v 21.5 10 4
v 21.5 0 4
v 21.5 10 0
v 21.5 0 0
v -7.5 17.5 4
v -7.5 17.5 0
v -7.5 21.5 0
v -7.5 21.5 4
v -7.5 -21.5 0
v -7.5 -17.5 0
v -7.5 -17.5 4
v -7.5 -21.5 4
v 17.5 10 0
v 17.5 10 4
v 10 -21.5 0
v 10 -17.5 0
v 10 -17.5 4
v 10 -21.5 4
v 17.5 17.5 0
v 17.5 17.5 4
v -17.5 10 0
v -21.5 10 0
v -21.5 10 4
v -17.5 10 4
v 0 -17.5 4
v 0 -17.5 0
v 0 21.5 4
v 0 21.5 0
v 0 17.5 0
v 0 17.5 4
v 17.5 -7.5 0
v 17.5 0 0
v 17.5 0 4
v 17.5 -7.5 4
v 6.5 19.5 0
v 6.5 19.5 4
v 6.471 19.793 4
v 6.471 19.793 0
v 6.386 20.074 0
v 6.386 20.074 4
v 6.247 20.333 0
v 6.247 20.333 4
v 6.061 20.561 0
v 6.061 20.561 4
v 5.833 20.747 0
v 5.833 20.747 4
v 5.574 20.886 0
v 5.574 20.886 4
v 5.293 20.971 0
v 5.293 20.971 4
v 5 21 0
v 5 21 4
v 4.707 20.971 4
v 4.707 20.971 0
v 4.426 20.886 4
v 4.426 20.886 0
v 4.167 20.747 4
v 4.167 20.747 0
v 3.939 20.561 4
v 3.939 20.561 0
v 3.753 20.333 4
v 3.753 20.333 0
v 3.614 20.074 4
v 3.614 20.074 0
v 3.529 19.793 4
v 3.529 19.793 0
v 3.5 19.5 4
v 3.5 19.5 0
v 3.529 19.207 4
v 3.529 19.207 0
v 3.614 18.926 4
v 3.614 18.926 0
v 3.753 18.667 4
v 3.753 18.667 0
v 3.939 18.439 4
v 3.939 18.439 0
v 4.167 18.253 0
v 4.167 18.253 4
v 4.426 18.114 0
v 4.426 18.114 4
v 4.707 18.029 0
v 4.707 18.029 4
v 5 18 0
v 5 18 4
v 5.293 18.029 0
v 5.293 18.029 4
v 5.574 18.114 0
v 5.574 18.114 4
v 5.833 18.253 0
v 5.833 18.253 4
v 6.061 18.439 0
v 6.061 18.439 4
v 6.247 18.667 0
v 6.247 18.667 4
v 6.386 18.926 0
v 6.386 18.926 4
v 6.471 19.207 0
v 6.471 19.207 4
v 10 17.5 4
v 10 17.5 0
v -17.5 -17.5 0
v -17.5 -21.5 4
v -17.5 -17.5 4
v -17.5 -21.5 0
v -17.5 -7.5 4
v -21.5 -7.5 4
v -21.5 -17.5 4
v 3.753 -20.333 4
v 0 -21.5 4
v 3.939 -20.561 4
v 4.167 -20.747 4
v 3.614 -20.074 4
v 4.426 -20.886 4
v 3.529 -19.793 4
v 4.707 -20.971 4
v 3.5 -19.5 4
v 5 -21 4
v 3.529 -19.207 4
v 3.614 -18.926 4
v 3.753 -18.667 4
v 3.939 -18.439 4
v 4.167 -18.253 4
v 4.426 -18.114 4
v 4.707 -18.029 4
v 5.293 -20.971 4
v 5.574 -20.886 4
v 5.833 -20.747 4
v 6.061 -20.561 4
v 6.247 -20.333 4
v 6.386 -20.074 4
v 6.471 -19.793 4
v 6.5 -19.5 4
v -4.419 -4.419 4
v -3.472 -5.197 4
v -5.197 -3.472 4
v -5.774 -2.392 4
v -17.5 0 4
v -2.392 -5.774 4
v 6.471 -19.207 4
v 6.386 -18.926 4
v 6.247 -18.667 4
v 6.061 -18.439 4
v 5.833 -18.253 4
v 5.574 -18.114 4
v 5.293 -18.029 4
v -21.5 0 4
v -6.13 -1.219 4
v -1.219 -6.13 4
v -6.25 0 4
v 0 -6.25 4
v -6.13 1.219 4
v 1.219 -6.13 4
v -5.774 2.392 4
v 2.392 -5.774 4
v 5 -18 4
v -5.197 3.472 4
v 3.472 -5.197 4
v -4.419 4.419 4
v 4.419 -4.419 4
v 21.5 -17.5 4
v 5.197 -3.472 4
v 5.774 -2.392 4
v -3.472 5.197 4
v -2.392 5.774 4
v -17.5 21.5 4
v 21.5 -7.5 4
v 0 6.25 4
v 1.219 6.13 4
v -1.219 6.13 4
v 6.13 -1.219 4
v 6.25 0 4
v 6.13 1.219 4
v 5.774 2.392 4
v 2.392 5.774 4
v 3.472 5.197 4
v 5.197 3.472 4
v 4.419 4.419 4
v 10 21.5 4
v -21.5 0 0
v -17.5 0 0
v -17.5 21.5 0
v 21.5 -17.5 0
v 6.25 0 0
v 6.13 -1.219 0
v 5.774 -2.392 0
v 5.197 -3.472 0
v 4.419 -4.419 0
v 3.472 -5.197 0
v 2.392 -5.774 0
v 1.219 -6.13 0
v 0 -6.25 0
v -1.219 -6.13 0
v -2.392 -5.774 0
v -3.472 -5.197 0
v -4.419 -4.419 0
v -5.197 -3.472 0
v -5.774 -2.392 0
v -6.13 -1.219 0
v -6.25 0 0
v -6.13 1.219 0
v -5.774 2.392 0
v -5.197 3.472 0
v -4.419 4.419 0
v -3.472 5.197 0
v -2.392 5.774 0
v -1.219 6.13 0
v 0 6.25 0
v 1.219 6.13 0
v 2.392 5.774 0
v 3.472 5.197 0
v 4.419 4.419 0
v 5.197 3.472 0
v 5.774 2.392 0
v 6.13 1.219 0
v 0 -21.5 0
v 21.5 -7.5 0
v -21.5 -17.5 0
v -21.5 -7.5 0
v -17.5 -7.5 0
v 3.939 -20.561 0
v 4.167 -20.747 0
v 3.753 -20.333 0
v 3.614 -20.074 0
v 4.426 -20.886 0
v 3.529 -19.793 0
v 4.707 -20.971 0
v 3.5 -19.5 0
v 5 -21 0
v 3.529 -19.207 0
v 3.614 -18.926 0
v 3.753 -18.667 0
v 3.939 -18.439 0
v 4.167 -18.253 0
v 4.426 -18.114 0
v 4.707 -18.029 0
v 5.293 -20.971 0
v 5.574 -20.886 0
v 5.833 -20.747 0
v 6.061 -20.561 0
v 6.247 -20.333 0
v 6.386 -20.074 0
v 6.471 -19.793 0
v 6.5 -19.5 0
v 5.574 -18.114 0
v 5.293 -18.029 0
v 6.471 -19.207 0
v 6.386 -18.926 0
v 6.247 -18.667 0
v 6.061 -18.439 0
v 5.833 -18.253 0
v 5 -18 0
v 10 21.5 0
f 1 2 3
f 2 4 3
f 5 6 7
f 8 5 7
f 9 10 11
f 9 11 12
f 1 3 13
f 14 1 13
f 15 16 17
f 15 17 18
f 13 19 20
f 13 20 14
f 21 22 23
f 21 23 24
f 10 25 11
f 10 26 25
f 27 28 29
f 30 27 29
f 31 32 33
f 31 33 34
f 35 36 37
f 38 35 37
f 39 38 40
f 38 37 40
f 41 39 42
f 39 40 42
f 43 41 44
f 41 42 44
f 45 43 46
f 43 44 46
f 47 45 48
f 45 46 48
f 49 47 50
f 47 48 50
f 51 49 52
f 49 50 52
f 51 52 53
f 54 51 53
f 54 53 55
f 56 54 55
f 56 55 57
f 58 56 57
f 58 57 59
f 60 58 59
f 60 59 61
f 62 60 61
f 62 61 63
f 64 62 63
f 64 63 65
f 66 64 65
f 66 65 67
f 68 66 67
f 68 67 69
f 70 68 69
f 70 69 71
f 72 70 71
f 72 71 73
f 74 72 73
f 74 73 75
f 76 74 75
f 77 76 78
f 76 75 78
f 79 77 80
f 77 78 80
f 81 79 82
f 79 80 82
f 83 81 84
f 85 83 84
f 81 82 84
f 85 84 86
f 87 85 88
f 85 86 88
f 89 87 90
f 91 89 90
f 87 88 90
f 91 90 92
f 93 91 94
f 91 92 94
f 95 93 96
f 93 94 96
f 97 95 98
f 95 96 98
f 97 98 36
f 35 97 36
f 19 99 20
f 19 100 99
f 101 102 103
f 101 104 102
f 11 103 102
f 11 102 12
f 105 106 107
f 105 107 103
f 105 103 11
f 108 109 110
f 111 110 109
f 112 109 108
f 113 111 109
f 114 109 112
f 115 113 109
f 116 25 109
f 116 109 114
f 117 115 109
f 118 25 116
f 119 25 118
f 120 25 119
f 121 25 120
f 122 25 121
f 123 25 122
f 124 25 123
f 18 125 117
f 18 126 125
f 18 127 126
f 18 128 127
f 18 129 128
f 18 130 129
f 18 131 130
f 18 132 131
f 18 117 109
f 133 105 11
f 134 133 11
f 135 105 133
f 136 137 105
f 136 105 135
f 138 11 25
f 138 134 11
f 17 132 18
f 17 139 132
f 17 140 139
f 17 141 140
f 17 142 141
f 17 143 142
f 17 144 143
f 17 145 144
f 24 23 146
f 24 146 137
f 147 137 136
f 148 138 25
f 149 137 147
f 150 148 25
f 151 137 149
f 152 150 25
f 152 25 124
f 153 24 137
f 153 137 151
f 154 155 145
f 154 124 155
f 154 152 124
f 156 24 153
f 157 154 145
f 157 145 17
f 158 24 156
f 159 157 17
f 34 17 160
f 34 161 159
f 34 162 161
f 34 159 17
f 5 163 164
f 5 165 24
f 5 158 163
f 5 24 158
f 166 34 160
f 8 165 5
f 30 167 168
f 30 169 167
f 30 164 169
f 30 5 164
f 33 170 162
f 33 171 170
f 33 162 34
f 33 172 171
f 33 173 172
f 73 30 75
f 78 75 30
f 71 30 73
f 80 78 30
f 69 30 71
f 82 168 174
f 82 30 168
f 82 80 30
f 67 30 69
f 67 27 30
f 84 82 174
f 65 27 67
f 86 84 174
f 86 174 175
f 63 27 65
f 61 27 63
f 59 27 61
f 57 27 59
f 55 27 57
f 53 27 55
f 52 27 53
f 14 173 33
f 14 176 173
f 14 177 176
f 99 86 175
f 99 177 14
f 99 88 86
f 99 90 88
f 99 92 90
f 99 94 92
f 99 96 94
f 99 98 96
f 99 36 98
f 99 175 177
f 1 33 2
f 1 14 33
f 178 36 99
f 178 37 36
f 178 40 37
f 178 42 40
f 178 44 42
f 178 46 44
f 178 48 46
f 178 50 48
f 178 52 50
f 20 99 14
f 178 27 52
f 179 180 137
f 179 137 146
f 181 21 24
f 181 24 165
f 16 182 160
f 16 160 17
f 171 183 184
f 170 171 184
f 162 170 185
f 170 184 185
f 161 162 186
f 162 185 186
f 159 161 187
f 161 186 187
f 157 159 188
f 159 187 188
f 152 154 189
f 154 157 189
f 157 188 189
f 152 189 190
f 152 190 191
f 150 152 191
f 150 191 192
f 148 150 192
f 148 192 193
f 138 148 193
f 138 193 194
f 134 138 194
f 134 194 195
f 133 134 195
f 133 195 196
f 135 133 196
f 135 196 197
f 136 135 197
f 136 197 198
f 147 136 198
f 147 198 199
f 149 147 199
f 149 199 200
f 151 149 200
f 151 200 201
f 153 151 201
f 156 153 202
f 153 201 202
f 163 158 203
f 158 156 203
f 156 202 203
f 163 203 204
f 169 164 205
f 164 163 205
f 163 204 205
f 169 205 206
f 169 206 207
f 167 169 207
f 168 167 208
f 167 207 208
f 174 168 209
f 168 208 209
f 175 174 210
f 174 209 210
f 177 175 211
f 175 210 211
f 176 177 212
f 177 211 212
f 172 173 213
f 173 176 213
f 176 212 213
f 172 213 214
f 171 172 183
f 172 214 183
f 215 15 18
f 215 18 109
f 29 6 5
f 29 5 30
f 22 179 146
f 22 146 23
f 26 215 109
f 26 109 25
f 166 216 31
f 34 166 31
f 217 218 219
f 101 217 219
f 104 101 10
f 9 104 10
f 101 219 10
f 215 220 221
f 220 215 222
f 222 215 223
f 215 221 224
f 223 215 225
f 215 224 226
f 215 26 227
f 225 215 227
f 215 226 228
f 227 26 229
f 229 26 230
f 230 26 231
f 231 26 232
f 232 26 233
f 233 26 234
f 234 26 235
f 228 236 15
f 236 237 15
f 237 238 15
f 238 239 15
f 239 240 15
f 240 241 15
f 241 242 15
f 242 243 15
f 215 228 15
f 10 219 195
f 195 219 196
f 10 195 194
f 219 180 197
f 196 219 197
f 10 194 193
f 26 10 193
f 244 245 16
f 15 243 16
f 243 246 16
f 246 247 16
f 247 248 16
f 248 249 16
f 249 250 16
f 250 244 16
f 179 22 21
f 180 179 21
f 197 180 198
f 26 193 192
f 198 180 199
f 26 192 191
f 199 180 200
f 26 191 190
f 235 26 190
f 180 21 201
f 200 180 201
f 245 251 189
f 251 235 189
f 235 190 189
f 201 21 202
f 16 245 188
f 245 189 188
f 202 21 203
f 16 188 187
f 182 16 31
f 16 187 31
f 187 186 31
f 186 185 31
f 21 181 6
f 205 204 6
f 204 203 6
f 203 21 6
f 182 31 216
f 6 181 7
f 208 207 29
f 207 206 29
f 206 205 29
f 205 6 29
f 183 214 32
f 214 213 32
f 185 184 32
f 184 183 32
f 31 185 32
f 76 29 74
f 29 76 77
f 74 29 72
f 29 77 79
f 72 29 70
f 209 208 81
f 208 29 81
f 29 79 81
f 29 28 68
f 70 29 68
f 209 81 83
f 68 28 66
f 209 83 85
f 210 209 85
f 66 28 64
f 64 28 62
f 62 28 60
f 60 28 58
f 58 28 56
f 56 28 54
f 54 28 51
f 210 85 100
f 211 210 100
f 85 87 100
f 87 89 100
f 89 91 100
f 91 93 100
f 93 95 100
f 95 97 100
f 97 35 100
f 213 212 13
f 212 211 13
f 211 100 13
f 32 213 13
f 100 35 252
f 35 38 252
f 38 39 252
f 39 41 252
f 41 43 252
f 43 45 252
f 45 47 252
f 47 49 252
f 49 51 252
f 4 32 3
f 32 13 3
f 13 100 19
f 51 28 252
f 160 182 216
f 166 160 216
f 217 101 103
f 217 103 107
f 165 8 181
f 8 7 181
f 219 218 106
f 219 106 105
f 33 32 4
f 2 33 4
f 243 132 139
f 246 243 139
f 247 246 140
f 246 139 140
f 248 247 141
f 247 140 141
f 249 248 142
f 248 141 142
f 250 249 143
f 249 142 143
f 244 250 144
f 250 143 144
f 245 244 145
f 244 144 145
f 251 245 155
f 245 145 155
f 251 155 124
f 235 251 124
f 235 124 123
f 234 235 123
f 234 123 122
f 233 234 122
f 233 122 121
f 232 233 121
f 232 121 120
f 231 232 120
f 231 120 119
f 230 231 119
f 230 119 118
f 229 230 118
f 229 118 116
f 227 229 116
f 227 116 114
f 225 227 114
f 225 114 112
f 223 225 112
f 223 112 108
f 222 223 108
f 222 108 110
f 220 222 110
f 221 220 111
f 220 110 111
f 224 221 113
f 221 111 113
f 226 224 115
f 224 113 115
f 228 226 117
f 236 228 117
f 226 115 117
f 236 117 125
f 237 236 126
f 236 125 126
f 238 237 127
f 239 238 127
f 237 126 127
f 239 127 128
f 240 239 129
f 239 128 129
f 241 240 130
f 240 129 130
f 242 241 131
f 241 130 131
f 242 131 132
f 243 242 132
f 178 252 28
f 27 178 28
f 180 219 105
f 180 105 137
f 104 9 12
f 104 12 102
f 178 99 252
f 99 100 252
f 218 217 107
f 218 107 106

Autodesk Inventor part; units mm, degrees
ref_plane "YZ Plane" through (0, 0, 0) normal (1, 0, 0) x (0, 1, 0)
ref_plane "XZ Plane" through (0, 0, 0) normal (0, 1, 0) x (-1, 0, 0)
ref_plane "XY Plane" through (0, 0, 0) normal (0, 0, 1) x (1, 0, 0)
sketch "Sketch1" plane through (0, 0, 0) normal (0, 0, 1) x (1, 0, 0)
  line L0 (17.5, -17.5) -> (0, -17.5)
  line L1 (-17.5, -17.5) -> (-17.5, 17.5)
  line L2 (-17.5, 17.5) -> (-7.5, 17.5) construction
  line L3 (17.5, 17.5) -> (17.5, 10)
  line L4 (17.5, -17.5) -> (-17.5, 17.5) construction
  line L5 (-17.5, -17.5) -> (17.5, 17.5) construction
  circle A0 centre (0, 0) radius 6.25
  line L6 (-17.5, -17.5) -> (-21.5, -17.5)
  line L7 (-21.5, -17.5) -> (-21.5, -7.5)
  line L8 (-21.5, -7.5) -> (-17.5, -7.5)
  line L9 (-17.5, -7.5) -> (-17.5, -17.5) construction
  line L10 (-17.5, 0) -> (-21.5, 0)
  line L11 (-21.5, 0) -> (-21.5, 10)
  line L12 (-21.5, 10) -> (-17.5, 10)
  line L13 (-17.5, 10) -> (-17.5, 0) construction
  line L14 (-17.5, 17.5) -> (-7.5, 17.5) construction
  line L15 (-7.5, 17.5) -> (-7.5, 21.5)
  line L16 (-7.5, 21.5) -> (-17.5, 21.5)
  line L17 (-17.5, 21.5) -> (-17.5, 17.5)
  line L18 (0, 17.5) -> (10, 17.5) construction
  line L19 (10, 17.5) -> (10, 21.5)
  line L20 (10, 21.5) -> (0, 21.5)
  line L21 (0, 21.5) -> (0, 17.5)
  line L22 (-17.5, 0) -> (17.5, 0) construction
  line L23 (0, -17.5) -> (0, 17.5) construction
  line L24 (-17.5, -17.5) -> (-7.5, -17.5)
  line L25 (-7.5, -17.5) -> (-7.5, -21.5)
  line L26 (-7.5, -21.5) -> (-17.5, -21.5)
  line L27 (-17.5, -21.5) -> (-17.5, -17.5)
  line L28 (0, -17.5) -> (10, -17.5) construction
  line L29 (10, -17.5) -> (10, -21.5)
  line L30 (10, -21.5) -> (0, -21.5)
  line L31 (0, -21.5) -> (0, -17.5)
  line L32 (17.5, -17.5) -> (21.5, -17.5)
  line L33 (21.5, -17.5) -> (21.5, -7.5)
  line L34 (21.5, -7.5) -> (17.5, -7.5)
  line L35 (17.5, -7.5) -> (17.5, -17.5) construction
  line L36 (17.5, 0) -> (21.5, 0)
  line L37 (21.5, 0) -> (21.5, 10)
  line L38 (21.5, 10) -> (17.5, 10)
  line L39 (17.5, 10) -> (17.5, 0) construction
  line L40 (-7.5, 17.5) -> (0, 17.5)
  line L41 (0, 17.5) -> (10, 17.5)
  line L42 (17.5, 10) -> (17.5, 0) construction
  line L43 (17.5, 0) -> (17.5, -7.5)
  line L44 (17.5, -7.5) -> (17.5, -17.5) construction
  line L45 (0, -17.5) -> (-17.5, -17.5)
  line L46 (10, 17.5) -> (17.5, 17.5)
  point P0 (0, 19.5)
  point P1 (-7.5, 19.5)
  point P2 (0, -19.5)
  point P3 (-7.5, -19.5)
  point P4 (-7.5, -17.5)
  point P5 (10, -17.5)
  dimension "d0" = 12.5
  dimension "d1" = 11.25
  dimension "d2" = 11.25
  dimension "d5" = 10
  dimension "d6" = 10
  dimension "d7" = 7.5
  dimension "d8" = 4
  dimension "d9" = 10
  dimension "d10" = 4
  dimension "d11" = 10
  dimension "d12" = 4
  dimension "d13" = 7.5
extrude "Extrusion1" add sketch "Sketch1" along normal blind 4
sketch "Sketch2" plane through (0, 0, 4) normal (0, 0, 1) x (1, 0, 0)
  line L0 (6.5, 17.5) -> (3.5, 17.5) construction
  line L1 (6.5, 21.5) -> (6.5, 17.5) construction
  line L2 (3.5, 21.5) -> (6.5, 21.5) construction
  line L3 (3.5, 21.5) -> (3.5, 17.5) construction
  line L4 (6.5, -21.5) -> (3.5, -21.5) construction
  line L5 (6.5, -17.5) -> (6.5, -21.5) construction
  line L6 (3.5, -17.5) -> (6.5, -17.5) construction
  line L7 (3.5, -17.5) -> (3.5, -21.5) construction
  line L8 (3.5, 17.5) -> (6.5, 21.5) construction
  line L9 (3.5, -17.5) -> (6.5, -21.5) construction
  circle A0 centre (5, 19.5) radius 1.5
  circle A1 centre (5, -19.5) radius 1.5
  point P0 (0, 0)
  dimension "d16" = 3
extrude "Extrusion2" cut sketch "Sketch2" against normal up to next
properties part number "FloorButtonHolder_Front_V1" material "MDF Medium Density Fiberboard"
